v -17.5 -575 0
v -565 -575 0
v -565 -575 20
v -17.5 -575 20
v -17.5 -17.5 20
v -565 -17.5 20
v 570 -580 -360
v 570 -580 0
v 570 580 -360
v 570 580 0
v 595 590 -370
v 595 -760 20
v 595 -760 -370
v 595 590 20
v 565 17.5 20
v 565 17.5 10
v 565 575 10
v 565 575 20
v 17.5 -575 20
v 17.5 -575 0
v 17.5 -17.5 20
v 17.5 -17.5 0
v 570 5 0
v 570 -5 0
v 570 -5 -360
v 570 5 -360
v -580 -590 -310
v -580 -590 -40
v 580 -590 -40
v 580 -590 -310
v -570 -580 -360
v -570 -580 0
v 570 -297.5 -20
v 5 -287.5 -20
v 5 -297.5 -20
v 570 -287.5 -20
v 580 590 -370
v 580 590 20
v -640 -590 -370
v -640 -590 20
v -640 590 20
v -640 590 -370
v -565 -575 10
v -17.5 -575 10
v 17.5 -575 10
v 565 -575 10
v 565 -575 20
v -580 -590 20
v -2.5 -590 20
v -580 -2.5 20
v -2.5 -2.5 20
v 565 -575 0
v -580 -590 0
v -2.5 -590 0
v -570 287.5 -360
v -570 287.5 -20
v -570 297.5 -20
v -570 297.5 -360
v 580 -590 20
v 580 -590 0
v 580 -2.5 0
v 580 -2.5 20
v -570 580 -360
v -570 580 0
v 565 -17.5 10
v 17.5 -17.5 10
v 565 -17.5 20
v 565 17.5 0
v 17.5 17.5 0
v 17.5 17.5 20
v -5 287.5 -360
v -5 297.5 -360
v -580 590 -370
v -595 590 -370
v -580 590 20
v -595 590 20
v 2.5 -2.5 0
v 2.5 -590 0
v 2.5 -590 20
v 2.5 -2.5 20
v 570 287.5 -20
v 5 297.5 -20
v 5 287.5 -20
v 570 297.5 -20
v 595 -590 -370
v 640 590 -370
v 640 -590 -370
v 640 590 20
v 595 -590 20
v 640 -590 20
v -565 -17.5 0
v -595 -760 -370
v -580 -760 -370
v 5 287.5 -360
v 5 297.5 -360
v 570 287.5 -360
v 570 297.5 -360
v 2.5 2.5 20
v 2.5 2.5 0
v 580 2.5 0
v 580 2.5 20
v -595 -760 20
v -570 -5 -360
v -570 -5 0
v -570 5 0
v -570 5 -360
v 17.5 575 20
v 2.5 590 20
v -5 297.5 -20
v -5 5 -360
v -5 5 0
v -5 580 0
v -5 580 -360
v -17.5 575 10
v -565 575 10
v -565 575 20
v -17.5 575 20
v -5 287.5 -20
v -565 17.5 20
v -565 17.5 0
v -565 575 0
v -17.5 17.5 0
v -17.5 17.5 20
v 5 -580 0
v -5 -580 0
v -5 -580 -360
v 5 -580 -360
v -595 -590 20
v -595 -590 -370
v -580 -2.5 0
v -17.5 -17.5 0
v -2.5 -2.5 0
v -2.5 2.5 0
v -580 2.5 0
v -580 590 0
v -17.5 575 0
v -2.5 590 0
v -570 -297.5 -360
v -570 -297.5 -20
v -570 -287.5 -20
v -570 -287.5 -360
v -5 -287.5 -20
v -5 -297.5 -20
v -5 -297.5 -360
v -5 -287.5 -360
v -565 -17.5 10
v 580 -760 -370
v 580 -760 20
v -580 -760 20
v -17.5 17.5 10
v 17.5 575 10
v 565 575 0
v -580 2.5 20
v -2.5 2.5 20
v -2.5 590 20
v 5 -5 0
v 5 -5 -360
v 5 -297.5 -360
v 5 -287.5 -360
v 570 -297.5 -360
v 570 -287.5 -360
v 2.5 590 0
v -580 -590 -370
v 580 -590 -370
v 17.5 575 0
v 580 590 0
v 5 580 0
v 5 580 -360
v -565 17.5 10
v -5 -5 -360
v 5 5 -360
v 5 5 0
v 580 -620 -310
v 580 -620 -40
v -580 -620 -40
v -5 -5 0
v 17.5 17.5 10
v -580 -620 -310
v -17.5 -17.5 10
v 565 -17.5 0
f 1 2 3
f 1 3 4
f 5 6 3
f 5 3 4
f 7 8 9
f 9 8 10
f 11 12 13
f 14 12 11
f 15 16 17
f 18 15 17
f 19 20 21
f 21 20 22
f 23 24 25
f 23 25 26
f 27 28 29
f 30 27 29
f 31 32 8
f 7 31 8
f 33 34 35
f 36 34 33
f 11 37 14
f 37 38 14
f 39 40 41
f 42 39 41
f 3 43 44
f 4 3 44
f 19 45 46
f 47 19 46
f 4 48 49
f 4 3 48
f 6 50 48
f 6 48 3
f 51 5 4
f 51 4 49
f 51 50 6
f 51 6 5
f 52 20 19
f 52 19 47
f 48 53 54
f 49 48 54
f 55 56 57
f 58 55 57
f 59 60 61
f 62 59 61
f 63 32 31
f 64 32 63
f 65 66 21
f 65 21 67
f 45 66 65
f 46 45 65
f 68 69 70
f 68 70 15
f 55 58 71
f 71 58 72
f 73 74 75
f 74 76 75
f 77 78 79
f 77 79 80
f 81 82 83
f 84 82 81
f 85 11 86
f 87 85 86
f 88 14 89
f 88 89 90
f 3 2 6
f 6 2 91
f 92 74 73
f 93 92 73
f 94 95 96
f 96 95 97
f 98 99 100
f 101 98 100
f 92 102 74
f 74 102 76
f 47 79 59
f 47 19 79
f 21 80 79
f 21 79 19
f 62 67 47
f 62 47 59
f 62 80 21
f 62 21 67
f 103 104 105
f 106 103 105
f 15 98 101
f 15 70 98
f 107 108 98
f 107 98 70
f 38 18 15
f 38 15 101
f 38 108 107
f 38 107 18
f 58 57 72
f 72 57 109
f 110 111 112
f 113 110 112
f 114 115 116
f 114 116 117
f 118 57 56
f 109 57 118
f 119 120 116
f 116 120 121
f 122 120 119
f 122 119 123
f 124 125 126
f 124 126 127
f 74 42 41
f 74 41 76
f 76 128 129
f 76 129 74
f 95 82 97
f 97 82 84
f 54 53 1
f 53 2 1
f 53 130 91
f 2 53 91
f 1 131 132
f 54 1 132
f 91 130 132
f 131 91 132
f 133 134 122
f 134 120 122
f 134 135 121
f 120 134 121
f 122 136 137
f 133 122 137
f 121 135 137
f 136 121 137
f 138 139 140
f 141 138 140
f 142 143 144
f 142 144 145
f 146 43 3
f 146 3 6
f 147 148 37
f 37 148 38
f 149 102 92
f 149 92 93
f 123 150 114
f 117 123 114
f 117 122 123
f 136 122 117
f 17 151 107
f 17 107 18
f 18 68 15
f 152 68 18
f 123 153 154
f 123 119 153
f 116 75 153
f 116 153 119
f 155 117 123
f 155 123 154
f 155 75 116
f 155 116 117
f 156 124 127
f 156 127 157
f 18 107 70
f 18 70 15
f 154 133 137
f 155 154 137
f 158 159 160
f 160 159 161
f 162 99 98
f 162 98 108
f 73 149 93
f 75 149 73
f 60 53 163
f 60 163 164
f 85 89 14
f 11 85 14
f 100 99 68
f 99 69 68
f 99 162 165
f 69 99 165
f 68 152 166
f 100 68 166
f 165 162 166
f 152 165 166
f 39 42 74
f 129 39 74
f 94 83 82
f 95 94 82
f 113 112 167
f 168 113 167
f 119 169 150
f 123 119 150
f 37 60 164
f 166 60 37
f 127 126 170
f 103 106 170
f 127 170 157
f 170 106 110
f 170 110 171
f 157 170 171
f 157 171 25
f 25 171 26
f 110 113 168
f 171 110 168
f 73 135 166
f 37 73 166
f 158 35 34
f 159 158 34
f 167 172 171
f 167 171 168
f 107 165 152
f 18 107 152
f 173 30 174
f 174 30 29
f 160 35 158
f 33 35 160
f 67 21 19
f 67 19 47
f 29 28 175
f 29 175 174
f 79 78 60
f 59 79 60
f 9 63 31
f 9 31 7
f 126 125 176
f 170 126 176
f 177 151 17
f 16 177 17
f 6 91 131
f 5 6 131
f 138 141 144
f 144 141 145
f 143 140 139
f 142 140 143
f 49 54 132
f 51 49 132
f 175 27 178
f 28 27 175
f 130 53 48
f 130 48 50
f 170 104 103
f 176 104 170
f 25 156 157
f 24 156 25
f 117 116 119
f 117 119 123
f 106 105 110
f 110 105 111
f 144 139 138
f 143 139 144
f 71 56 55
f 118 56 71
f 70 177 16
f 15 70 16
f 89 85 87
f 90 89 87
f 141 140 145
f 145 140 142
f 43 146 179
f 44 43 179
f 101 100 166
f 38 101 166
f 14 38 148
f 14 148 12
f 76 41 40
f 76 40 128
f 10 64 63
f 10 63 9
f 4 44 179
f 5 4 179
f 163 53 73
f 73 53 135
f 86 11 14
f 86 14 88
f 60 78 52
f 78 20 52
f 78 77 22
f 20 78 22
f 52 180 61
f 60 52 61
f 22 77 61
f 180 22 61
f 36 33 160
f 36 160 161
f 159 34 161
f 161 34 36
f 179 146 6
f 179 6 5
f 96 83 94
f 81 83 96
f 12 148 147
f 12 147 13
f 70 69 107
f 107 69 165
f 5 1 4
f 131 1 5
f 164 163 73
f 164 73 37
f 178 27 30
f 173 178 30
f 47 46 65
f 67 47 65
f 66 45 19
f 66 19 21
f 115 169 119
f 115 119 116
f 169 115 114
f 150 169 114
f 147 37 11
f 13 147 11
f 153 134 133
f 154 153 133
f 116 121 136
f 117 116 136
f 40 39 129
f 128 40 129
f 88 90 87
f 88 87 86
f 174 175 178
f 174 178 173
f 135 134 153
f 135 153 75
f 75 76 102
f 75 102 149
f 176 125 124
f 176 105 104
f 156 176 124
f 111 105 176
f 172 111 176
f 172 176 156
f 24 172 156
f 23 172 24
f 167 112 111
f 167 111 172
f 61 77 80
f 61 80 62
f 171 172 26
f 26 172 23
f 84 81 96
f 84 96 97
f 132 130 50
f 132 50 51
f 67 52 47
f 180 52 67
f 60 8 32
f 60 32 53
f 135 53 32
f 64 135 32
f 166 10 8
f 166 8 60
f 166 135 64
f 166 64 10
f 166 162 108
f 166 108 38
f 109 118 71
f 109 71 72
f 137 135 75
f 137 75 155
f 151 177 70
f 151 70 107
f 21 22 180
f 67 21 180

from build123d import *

# Parameters (mm, degrees)
CROQUIS1_W                     = 1160
CROQUIS1_H                     = 1180
SALIENTE_EXTRUIR1_DEPTH        = 370
VACIADO1_T                     = -10
CROQUIS1_4_W                   = 45
CROQUIS1_4_H                   = 1180
SALIENTE_EXTRUIR3_DEPTH        = 20
SALIENTE_EXTRUIR3_DEPTH_BACK   = 370
SALIENTE_EXTRUIR3_2_DEPTH      = 20
SALIENTE_EXTRUIR3_2_DEPTH_BACK = 370
CROQUIS2_W                     = 15
CROQUIS2_H                     = 1350
SALIENTE_EXTRUIR2_DEPTH        = 20
SALIENTE_EXTRUIR2_DEPTH_BACK   = 370
SALIENTE_EXTRUIR2_2_DEPTH      = 20
SALIENTE_EXTRUIR2_2_DEPTH_BACK = 370
CROQUIS3_W                     = 10
CROQUIS3_H                     = 1160
CROQUIS3_W_2                   = 1140
CROQUIS3_H_2                   = 10
SALIENTE_EXTRUIR4_DEPTH        = 360
SALIENTE_EXTRUIR5_START        = -20
CROQUIS4_W                     = 565
CROQUIS4_H                     = 10
SALIENTE_EXTRUIR5_DEPTH        = 340
SALIENTE_EXTRUIR5_2_DEPTH      = 340
SALIENTE_EXTRUIR5_3_DEPTH      = 340
SALIENTE_EXTRUIR5_4_DEPTH      = 340
CROQUIS5_W                     = 577.5
CROQUIS5_H                     = 587.5
CROQUIS5_W_2                   = 547.5
CROQUIS5_H_2                   = 557.5
SALIENTE_EXTRUIR6_DEPTH        = 20
SALIENTE_EXTRUIR6_2_DEPTH      = 20
SALIENTE_EXTRUIR6_3_DEPTH      = 20
SALIENTE_EXTRUIR6_4_DEPTH      = 20
SALIENTE_EXTRUIR7_START        = 10
CROQUIS5_2_W                   = 547.5
CROQUIS5_2_H                   = 557.5
SALIENTE_EXTRUIR7_DEPTH        = 10
SALIENTE_EXTRUIR7_2_DEPTH      = 10
SALIENTE_EXTRUIR7_3_DEPTH      = 10
SALIENTE_EXTRUIR7_4_DEPTH      = 10
CROQUIS6_W                     = 1160
CROQUIS6_H                     = 270
SALIENTE_EXTRUIR8_DEPTH        = 30


with BuildPart() as part:
    # Croquis1 → Saliente-Extruir1 (new body)
    with BuildSketch(Plane.XY):
        Rectangle(CROQUIS1_W, CROQUIS1_H)
    extrude(amount=-SALIENTE_EXTRUIR1_DEPTH)

    # Vaciado1
    vaciado1_openings = [part.faces().sort_by_distance(p)[0] for p in [
        (0, 0, 0),
    ]]
    offset(amount=VACIADO1_T, openings=vaciado1_openings, kind=Kind.INTERSECTION)


with BuildPart() as body_2:
    # Croquis1_4 → Saliente-Extruir3 (new body, two sides)
    with BuildSketch(Plane.XY) as saliente_extruir3_sk:
        with Locations((-617.5, 0)):
            Rectangle(CROQUIS1_4_W, CROQUIS1_4_H)
    extrude(amount=SALIENTE_EXTRUIR3_DEPTH)
    extrude(saliente_extruir3_sk.sketch, amount=-SALIENTE_EXTRUIR3_DEPTH_BACK)


with BuildPart() as body_3:
    # Croquis1_4 → Saliente-Extruir3 2 (new body, two sides)
    with BuildSketch(Plane.XY) as saliente_extruir3_2_sk:
        with Locations((617.5, 0)):
            Rectangle(CROQUIS1_4_W, CROQUIS1_4_H)
    extrude(amount=SALIENTE_EXTRUIR3_2_DEPTH)
    extrude(saliente_extruir3_2_sk.sketch, amount=-SALIENTE_EXTRUIR3_2_DEPTH_BACK)


with BuildPart() as body_4:
    # Croquis2 → Saliente-Extruir2 (new body, two sides)
    with BuildSketch(Plane.XY) as saliente_extruir2_sk:
        with Locations((-587.5, -85)):
            Rectangle(CROQUIS2_W, CROQUIS2_H)
    extrude(amount=SALIENTE_EXTRUIR2_DEPTH)
    extrude(saliente_extruir2_sk.sketch, amount=-SALIENTE_EXTRUIR2_DEPTH_BACK)


with BuildPart() as body_5:
    # Croquis2 → Saliente-Extruir2 2 (new body, two sides)
    with BuildSketch(Plane.XY) as saliente_extruir2_2_sk:
        with Locations((587.5, -85)):
            Rectangle(CROQUIS2_W, CROQUIS2_H)
    extrude(amount=SALIENTE_EXTRUIR2_2_DEPTH)
    extrude(saliente_extruir2_2_sk.sketch, amount=-SALIENTE_EXTRUIR2_2_DEPTH_BACK)


with BuildPart() as body_6:
    # Croquis3 → Saliente-Extruir4 (new body)
    with BuildSketch(Plane.XY):
        Rectangle(CROQUIS3_W, CROQUIS3_H)
        Rectangle(CROQUIS3_W_2, CROQUIS3_H_2)
    extrude(amount=-SALIENTE_EXTRUIR4_DEPTH)


with BuildPart() as body_7:
    # Croquis4 → Saliente-Extruir5 (new body)
    with BuildSketch(Plane.XY.offset(SALIENTE_EXTRUIR5_START)):
        with Locations((-287.5, 292.5)):
            Rectangle(CROQUIS4_W, CROQUIS4_H)
    extrude(amount=-SALIENTE_EXTRUIR5_DEPTH)


with BuildPart() as body_8:
    # Croquis4 → Saliente-Extruir5 2 (new body)
    with BuildSketch(Plane.XY.offset(SALIENTE_EXTRUIR5_START)):
        with Locations((287.5, 292.5)):
            Rectangle(CROQUIS4_W, CROQUIS4_H)
    extrude(amount=-SALIENTE_EXTRUIR5_2_DEPTH)


with BuildPart() as body_9:
    # Croquis4 → Saliente-Extruir5 3 (new body)
    with BuildSketch(Plane.XY.offset(SALIENTE_EXTRUIR5_START)):
        with Locations((287.5, -292.5)):
            Rectangle(CROQUIS4_W, CROQUIS4_H)
    extrude(amount=-SALIENTE_EXTRUIR5_3_DEPTH)


with BuildPart() as body_10:
    # Croquis4 → Saliente-Extruir5 4 (new body)
    with BuildSketch(Plane.XY.offset(SALIENTE_EXTRUIR5_START)):
        with Locations((-287.5, -292.5)):
            Rectangle(CROQUIS4_W, CROQUIS4_H)
    extrude(amount=-SALIENTE_EXTRUIR5_4_DEPTH)


with BuildPart() as body_11:
    # Croquis5 → Saliente-Extruir6 (new body)
    with BuildSketch(Plane.XY):
        with Locations((-291.25, -296.25)):
            Rectangle(CROQUIS5_W, CROQUIS5_H)
        with Locations((-291.25, -296.25)):
            Rectangle(CROQUIS5_W_2, CROQUIS5_H_2, mode=Mode.SUBTRACT)
    extrude(amount=SALIENTE_EXTRUIR6_DEPTH)


with BuildPart() as body_12:
    # Croquis5 → Saliente-Extruir6 2 (new body)
    with BuildSketch(Plane.XY):
        with Locations((-291.25, 296.25)):
            Rectangle(CROQUIS5_W, CROQUIS5_H)
        with Locations((-291.25, 296.25)):
            Rectangle(CROQUIS5_W_2, CROQUIS5_H_2, mode=Mode.SUBTRACT)
    extrude(amount=SALIENTE_EXTRUIR6_2_DEPTH)


with BuildPart() as body_13:
    # Croquis5 → Saliente-Extruir6 3 (new body)
    with BuildSketch(Plane.XY):
        with Locations((291.25, 296.25)):
            Rectangle(CROQUIS5_W, CROQUIS5_H)
        with Locations((291.25, 296.25)):
            Rectangle(CROQUIS5_W_2, CROQUIS5_H_2, mode=Mode.SUBTRACT)
    extrude(amount=SALIENTE_EXTRUIR6_3_DEPTH)


with BuildPart() as body_14:
    # Croquis5 → Saliente-Extruir6 4 (new body)
    with BuildSketch(Plane.XY):
        with Locations((291.25, -296.25)):
            Rectangle(CROQUIS5_W, CROQUIS5_H)
        with Locations((291.25, -296.25)):
            Rectangle(CROQUIS5_W_2, CROQUIS5_H_2, mode=Mode.SUBTRACT)
    extrude(amount=SALIENTE_EXTRUIR6_4_DEPTH)


with BuildPart() as body_15:
    # Croquis5_2 → Saliente-Extruir7 (new body)
    with BuildSketch(Plane.XY.offset(SALIENTE_EXTRUIR7_START)):
        with Locations((-291.25, 296.25)):
            Rectangle(CROQUIS5_2_W, CROQUIS5_2_H)
    extrude(amount=SALIENTE_EXTRUIR7_DEPTH)


with BuildPart() as body_16:
    # Croquis5_2 → Saliente-Extruir7 2 (new body)
    with BuildSketch(Plane.XY.offset(SALIENTE_EXTRUIR7_START)):
        with Locations((291.25, 296.25)):
            Rectangle(CROQUIS5_2_W, CROQUIS5_2_H)
    extrude(amount=SALIENTE_EXTRUIR7_2_DEPTH)


with BuildPart() as body_17:
    # Croquis5_2 → Saliente-Extruir7 3 (new body)
    with BuildSketch(Plane.XY.offset(SALIENTE_EXTRUIR7_START)):
        with Locations((-291.25, -296.25)):
            Rectangle(CROQUIS5_2_W, CROQUIS5_2_H)
    extrude(amount=SALIENTE_EXTRUIR7_3_DEPTH)


with BuildPart() as body_18:
    # Croquis5_2 → Saliente-Extruir7 4 (new body)
    with BuildSketch(Plane.XY.offset(SALIENTE_EXTRUIR7_START)):
        with Locations((291.25, -296.25)):
            Rectangle(CROQUIS5_2_W, CROQUIS5_2_H)
    extrude(amount=SALIENTE_EXTRUIR7_4_DEPTH)


with BuildPart() as body_19:
    # Croquis6 → Saliente-Extruir8 (new body)
    with BuildSketch(Plane.XZ.offset(590)):
        with Locations((0, -175)):
            Rectangle(CROQUIS6_W, CROQUIS6_H)
    extrude(amount=SALIENTE_EXTRUIR8_DEPTH)


solid = Compound([part.part, body_2.part, body_3.part, body_4.part, body_5.part, body_6.part, body_7.part, body_8.part, body_9.part, body_10.part, body_11.part, body_12.part, body_13.part, body_14.part, body_15.part, body_16.part, body_17.part, body_18.part, body_19.part])
